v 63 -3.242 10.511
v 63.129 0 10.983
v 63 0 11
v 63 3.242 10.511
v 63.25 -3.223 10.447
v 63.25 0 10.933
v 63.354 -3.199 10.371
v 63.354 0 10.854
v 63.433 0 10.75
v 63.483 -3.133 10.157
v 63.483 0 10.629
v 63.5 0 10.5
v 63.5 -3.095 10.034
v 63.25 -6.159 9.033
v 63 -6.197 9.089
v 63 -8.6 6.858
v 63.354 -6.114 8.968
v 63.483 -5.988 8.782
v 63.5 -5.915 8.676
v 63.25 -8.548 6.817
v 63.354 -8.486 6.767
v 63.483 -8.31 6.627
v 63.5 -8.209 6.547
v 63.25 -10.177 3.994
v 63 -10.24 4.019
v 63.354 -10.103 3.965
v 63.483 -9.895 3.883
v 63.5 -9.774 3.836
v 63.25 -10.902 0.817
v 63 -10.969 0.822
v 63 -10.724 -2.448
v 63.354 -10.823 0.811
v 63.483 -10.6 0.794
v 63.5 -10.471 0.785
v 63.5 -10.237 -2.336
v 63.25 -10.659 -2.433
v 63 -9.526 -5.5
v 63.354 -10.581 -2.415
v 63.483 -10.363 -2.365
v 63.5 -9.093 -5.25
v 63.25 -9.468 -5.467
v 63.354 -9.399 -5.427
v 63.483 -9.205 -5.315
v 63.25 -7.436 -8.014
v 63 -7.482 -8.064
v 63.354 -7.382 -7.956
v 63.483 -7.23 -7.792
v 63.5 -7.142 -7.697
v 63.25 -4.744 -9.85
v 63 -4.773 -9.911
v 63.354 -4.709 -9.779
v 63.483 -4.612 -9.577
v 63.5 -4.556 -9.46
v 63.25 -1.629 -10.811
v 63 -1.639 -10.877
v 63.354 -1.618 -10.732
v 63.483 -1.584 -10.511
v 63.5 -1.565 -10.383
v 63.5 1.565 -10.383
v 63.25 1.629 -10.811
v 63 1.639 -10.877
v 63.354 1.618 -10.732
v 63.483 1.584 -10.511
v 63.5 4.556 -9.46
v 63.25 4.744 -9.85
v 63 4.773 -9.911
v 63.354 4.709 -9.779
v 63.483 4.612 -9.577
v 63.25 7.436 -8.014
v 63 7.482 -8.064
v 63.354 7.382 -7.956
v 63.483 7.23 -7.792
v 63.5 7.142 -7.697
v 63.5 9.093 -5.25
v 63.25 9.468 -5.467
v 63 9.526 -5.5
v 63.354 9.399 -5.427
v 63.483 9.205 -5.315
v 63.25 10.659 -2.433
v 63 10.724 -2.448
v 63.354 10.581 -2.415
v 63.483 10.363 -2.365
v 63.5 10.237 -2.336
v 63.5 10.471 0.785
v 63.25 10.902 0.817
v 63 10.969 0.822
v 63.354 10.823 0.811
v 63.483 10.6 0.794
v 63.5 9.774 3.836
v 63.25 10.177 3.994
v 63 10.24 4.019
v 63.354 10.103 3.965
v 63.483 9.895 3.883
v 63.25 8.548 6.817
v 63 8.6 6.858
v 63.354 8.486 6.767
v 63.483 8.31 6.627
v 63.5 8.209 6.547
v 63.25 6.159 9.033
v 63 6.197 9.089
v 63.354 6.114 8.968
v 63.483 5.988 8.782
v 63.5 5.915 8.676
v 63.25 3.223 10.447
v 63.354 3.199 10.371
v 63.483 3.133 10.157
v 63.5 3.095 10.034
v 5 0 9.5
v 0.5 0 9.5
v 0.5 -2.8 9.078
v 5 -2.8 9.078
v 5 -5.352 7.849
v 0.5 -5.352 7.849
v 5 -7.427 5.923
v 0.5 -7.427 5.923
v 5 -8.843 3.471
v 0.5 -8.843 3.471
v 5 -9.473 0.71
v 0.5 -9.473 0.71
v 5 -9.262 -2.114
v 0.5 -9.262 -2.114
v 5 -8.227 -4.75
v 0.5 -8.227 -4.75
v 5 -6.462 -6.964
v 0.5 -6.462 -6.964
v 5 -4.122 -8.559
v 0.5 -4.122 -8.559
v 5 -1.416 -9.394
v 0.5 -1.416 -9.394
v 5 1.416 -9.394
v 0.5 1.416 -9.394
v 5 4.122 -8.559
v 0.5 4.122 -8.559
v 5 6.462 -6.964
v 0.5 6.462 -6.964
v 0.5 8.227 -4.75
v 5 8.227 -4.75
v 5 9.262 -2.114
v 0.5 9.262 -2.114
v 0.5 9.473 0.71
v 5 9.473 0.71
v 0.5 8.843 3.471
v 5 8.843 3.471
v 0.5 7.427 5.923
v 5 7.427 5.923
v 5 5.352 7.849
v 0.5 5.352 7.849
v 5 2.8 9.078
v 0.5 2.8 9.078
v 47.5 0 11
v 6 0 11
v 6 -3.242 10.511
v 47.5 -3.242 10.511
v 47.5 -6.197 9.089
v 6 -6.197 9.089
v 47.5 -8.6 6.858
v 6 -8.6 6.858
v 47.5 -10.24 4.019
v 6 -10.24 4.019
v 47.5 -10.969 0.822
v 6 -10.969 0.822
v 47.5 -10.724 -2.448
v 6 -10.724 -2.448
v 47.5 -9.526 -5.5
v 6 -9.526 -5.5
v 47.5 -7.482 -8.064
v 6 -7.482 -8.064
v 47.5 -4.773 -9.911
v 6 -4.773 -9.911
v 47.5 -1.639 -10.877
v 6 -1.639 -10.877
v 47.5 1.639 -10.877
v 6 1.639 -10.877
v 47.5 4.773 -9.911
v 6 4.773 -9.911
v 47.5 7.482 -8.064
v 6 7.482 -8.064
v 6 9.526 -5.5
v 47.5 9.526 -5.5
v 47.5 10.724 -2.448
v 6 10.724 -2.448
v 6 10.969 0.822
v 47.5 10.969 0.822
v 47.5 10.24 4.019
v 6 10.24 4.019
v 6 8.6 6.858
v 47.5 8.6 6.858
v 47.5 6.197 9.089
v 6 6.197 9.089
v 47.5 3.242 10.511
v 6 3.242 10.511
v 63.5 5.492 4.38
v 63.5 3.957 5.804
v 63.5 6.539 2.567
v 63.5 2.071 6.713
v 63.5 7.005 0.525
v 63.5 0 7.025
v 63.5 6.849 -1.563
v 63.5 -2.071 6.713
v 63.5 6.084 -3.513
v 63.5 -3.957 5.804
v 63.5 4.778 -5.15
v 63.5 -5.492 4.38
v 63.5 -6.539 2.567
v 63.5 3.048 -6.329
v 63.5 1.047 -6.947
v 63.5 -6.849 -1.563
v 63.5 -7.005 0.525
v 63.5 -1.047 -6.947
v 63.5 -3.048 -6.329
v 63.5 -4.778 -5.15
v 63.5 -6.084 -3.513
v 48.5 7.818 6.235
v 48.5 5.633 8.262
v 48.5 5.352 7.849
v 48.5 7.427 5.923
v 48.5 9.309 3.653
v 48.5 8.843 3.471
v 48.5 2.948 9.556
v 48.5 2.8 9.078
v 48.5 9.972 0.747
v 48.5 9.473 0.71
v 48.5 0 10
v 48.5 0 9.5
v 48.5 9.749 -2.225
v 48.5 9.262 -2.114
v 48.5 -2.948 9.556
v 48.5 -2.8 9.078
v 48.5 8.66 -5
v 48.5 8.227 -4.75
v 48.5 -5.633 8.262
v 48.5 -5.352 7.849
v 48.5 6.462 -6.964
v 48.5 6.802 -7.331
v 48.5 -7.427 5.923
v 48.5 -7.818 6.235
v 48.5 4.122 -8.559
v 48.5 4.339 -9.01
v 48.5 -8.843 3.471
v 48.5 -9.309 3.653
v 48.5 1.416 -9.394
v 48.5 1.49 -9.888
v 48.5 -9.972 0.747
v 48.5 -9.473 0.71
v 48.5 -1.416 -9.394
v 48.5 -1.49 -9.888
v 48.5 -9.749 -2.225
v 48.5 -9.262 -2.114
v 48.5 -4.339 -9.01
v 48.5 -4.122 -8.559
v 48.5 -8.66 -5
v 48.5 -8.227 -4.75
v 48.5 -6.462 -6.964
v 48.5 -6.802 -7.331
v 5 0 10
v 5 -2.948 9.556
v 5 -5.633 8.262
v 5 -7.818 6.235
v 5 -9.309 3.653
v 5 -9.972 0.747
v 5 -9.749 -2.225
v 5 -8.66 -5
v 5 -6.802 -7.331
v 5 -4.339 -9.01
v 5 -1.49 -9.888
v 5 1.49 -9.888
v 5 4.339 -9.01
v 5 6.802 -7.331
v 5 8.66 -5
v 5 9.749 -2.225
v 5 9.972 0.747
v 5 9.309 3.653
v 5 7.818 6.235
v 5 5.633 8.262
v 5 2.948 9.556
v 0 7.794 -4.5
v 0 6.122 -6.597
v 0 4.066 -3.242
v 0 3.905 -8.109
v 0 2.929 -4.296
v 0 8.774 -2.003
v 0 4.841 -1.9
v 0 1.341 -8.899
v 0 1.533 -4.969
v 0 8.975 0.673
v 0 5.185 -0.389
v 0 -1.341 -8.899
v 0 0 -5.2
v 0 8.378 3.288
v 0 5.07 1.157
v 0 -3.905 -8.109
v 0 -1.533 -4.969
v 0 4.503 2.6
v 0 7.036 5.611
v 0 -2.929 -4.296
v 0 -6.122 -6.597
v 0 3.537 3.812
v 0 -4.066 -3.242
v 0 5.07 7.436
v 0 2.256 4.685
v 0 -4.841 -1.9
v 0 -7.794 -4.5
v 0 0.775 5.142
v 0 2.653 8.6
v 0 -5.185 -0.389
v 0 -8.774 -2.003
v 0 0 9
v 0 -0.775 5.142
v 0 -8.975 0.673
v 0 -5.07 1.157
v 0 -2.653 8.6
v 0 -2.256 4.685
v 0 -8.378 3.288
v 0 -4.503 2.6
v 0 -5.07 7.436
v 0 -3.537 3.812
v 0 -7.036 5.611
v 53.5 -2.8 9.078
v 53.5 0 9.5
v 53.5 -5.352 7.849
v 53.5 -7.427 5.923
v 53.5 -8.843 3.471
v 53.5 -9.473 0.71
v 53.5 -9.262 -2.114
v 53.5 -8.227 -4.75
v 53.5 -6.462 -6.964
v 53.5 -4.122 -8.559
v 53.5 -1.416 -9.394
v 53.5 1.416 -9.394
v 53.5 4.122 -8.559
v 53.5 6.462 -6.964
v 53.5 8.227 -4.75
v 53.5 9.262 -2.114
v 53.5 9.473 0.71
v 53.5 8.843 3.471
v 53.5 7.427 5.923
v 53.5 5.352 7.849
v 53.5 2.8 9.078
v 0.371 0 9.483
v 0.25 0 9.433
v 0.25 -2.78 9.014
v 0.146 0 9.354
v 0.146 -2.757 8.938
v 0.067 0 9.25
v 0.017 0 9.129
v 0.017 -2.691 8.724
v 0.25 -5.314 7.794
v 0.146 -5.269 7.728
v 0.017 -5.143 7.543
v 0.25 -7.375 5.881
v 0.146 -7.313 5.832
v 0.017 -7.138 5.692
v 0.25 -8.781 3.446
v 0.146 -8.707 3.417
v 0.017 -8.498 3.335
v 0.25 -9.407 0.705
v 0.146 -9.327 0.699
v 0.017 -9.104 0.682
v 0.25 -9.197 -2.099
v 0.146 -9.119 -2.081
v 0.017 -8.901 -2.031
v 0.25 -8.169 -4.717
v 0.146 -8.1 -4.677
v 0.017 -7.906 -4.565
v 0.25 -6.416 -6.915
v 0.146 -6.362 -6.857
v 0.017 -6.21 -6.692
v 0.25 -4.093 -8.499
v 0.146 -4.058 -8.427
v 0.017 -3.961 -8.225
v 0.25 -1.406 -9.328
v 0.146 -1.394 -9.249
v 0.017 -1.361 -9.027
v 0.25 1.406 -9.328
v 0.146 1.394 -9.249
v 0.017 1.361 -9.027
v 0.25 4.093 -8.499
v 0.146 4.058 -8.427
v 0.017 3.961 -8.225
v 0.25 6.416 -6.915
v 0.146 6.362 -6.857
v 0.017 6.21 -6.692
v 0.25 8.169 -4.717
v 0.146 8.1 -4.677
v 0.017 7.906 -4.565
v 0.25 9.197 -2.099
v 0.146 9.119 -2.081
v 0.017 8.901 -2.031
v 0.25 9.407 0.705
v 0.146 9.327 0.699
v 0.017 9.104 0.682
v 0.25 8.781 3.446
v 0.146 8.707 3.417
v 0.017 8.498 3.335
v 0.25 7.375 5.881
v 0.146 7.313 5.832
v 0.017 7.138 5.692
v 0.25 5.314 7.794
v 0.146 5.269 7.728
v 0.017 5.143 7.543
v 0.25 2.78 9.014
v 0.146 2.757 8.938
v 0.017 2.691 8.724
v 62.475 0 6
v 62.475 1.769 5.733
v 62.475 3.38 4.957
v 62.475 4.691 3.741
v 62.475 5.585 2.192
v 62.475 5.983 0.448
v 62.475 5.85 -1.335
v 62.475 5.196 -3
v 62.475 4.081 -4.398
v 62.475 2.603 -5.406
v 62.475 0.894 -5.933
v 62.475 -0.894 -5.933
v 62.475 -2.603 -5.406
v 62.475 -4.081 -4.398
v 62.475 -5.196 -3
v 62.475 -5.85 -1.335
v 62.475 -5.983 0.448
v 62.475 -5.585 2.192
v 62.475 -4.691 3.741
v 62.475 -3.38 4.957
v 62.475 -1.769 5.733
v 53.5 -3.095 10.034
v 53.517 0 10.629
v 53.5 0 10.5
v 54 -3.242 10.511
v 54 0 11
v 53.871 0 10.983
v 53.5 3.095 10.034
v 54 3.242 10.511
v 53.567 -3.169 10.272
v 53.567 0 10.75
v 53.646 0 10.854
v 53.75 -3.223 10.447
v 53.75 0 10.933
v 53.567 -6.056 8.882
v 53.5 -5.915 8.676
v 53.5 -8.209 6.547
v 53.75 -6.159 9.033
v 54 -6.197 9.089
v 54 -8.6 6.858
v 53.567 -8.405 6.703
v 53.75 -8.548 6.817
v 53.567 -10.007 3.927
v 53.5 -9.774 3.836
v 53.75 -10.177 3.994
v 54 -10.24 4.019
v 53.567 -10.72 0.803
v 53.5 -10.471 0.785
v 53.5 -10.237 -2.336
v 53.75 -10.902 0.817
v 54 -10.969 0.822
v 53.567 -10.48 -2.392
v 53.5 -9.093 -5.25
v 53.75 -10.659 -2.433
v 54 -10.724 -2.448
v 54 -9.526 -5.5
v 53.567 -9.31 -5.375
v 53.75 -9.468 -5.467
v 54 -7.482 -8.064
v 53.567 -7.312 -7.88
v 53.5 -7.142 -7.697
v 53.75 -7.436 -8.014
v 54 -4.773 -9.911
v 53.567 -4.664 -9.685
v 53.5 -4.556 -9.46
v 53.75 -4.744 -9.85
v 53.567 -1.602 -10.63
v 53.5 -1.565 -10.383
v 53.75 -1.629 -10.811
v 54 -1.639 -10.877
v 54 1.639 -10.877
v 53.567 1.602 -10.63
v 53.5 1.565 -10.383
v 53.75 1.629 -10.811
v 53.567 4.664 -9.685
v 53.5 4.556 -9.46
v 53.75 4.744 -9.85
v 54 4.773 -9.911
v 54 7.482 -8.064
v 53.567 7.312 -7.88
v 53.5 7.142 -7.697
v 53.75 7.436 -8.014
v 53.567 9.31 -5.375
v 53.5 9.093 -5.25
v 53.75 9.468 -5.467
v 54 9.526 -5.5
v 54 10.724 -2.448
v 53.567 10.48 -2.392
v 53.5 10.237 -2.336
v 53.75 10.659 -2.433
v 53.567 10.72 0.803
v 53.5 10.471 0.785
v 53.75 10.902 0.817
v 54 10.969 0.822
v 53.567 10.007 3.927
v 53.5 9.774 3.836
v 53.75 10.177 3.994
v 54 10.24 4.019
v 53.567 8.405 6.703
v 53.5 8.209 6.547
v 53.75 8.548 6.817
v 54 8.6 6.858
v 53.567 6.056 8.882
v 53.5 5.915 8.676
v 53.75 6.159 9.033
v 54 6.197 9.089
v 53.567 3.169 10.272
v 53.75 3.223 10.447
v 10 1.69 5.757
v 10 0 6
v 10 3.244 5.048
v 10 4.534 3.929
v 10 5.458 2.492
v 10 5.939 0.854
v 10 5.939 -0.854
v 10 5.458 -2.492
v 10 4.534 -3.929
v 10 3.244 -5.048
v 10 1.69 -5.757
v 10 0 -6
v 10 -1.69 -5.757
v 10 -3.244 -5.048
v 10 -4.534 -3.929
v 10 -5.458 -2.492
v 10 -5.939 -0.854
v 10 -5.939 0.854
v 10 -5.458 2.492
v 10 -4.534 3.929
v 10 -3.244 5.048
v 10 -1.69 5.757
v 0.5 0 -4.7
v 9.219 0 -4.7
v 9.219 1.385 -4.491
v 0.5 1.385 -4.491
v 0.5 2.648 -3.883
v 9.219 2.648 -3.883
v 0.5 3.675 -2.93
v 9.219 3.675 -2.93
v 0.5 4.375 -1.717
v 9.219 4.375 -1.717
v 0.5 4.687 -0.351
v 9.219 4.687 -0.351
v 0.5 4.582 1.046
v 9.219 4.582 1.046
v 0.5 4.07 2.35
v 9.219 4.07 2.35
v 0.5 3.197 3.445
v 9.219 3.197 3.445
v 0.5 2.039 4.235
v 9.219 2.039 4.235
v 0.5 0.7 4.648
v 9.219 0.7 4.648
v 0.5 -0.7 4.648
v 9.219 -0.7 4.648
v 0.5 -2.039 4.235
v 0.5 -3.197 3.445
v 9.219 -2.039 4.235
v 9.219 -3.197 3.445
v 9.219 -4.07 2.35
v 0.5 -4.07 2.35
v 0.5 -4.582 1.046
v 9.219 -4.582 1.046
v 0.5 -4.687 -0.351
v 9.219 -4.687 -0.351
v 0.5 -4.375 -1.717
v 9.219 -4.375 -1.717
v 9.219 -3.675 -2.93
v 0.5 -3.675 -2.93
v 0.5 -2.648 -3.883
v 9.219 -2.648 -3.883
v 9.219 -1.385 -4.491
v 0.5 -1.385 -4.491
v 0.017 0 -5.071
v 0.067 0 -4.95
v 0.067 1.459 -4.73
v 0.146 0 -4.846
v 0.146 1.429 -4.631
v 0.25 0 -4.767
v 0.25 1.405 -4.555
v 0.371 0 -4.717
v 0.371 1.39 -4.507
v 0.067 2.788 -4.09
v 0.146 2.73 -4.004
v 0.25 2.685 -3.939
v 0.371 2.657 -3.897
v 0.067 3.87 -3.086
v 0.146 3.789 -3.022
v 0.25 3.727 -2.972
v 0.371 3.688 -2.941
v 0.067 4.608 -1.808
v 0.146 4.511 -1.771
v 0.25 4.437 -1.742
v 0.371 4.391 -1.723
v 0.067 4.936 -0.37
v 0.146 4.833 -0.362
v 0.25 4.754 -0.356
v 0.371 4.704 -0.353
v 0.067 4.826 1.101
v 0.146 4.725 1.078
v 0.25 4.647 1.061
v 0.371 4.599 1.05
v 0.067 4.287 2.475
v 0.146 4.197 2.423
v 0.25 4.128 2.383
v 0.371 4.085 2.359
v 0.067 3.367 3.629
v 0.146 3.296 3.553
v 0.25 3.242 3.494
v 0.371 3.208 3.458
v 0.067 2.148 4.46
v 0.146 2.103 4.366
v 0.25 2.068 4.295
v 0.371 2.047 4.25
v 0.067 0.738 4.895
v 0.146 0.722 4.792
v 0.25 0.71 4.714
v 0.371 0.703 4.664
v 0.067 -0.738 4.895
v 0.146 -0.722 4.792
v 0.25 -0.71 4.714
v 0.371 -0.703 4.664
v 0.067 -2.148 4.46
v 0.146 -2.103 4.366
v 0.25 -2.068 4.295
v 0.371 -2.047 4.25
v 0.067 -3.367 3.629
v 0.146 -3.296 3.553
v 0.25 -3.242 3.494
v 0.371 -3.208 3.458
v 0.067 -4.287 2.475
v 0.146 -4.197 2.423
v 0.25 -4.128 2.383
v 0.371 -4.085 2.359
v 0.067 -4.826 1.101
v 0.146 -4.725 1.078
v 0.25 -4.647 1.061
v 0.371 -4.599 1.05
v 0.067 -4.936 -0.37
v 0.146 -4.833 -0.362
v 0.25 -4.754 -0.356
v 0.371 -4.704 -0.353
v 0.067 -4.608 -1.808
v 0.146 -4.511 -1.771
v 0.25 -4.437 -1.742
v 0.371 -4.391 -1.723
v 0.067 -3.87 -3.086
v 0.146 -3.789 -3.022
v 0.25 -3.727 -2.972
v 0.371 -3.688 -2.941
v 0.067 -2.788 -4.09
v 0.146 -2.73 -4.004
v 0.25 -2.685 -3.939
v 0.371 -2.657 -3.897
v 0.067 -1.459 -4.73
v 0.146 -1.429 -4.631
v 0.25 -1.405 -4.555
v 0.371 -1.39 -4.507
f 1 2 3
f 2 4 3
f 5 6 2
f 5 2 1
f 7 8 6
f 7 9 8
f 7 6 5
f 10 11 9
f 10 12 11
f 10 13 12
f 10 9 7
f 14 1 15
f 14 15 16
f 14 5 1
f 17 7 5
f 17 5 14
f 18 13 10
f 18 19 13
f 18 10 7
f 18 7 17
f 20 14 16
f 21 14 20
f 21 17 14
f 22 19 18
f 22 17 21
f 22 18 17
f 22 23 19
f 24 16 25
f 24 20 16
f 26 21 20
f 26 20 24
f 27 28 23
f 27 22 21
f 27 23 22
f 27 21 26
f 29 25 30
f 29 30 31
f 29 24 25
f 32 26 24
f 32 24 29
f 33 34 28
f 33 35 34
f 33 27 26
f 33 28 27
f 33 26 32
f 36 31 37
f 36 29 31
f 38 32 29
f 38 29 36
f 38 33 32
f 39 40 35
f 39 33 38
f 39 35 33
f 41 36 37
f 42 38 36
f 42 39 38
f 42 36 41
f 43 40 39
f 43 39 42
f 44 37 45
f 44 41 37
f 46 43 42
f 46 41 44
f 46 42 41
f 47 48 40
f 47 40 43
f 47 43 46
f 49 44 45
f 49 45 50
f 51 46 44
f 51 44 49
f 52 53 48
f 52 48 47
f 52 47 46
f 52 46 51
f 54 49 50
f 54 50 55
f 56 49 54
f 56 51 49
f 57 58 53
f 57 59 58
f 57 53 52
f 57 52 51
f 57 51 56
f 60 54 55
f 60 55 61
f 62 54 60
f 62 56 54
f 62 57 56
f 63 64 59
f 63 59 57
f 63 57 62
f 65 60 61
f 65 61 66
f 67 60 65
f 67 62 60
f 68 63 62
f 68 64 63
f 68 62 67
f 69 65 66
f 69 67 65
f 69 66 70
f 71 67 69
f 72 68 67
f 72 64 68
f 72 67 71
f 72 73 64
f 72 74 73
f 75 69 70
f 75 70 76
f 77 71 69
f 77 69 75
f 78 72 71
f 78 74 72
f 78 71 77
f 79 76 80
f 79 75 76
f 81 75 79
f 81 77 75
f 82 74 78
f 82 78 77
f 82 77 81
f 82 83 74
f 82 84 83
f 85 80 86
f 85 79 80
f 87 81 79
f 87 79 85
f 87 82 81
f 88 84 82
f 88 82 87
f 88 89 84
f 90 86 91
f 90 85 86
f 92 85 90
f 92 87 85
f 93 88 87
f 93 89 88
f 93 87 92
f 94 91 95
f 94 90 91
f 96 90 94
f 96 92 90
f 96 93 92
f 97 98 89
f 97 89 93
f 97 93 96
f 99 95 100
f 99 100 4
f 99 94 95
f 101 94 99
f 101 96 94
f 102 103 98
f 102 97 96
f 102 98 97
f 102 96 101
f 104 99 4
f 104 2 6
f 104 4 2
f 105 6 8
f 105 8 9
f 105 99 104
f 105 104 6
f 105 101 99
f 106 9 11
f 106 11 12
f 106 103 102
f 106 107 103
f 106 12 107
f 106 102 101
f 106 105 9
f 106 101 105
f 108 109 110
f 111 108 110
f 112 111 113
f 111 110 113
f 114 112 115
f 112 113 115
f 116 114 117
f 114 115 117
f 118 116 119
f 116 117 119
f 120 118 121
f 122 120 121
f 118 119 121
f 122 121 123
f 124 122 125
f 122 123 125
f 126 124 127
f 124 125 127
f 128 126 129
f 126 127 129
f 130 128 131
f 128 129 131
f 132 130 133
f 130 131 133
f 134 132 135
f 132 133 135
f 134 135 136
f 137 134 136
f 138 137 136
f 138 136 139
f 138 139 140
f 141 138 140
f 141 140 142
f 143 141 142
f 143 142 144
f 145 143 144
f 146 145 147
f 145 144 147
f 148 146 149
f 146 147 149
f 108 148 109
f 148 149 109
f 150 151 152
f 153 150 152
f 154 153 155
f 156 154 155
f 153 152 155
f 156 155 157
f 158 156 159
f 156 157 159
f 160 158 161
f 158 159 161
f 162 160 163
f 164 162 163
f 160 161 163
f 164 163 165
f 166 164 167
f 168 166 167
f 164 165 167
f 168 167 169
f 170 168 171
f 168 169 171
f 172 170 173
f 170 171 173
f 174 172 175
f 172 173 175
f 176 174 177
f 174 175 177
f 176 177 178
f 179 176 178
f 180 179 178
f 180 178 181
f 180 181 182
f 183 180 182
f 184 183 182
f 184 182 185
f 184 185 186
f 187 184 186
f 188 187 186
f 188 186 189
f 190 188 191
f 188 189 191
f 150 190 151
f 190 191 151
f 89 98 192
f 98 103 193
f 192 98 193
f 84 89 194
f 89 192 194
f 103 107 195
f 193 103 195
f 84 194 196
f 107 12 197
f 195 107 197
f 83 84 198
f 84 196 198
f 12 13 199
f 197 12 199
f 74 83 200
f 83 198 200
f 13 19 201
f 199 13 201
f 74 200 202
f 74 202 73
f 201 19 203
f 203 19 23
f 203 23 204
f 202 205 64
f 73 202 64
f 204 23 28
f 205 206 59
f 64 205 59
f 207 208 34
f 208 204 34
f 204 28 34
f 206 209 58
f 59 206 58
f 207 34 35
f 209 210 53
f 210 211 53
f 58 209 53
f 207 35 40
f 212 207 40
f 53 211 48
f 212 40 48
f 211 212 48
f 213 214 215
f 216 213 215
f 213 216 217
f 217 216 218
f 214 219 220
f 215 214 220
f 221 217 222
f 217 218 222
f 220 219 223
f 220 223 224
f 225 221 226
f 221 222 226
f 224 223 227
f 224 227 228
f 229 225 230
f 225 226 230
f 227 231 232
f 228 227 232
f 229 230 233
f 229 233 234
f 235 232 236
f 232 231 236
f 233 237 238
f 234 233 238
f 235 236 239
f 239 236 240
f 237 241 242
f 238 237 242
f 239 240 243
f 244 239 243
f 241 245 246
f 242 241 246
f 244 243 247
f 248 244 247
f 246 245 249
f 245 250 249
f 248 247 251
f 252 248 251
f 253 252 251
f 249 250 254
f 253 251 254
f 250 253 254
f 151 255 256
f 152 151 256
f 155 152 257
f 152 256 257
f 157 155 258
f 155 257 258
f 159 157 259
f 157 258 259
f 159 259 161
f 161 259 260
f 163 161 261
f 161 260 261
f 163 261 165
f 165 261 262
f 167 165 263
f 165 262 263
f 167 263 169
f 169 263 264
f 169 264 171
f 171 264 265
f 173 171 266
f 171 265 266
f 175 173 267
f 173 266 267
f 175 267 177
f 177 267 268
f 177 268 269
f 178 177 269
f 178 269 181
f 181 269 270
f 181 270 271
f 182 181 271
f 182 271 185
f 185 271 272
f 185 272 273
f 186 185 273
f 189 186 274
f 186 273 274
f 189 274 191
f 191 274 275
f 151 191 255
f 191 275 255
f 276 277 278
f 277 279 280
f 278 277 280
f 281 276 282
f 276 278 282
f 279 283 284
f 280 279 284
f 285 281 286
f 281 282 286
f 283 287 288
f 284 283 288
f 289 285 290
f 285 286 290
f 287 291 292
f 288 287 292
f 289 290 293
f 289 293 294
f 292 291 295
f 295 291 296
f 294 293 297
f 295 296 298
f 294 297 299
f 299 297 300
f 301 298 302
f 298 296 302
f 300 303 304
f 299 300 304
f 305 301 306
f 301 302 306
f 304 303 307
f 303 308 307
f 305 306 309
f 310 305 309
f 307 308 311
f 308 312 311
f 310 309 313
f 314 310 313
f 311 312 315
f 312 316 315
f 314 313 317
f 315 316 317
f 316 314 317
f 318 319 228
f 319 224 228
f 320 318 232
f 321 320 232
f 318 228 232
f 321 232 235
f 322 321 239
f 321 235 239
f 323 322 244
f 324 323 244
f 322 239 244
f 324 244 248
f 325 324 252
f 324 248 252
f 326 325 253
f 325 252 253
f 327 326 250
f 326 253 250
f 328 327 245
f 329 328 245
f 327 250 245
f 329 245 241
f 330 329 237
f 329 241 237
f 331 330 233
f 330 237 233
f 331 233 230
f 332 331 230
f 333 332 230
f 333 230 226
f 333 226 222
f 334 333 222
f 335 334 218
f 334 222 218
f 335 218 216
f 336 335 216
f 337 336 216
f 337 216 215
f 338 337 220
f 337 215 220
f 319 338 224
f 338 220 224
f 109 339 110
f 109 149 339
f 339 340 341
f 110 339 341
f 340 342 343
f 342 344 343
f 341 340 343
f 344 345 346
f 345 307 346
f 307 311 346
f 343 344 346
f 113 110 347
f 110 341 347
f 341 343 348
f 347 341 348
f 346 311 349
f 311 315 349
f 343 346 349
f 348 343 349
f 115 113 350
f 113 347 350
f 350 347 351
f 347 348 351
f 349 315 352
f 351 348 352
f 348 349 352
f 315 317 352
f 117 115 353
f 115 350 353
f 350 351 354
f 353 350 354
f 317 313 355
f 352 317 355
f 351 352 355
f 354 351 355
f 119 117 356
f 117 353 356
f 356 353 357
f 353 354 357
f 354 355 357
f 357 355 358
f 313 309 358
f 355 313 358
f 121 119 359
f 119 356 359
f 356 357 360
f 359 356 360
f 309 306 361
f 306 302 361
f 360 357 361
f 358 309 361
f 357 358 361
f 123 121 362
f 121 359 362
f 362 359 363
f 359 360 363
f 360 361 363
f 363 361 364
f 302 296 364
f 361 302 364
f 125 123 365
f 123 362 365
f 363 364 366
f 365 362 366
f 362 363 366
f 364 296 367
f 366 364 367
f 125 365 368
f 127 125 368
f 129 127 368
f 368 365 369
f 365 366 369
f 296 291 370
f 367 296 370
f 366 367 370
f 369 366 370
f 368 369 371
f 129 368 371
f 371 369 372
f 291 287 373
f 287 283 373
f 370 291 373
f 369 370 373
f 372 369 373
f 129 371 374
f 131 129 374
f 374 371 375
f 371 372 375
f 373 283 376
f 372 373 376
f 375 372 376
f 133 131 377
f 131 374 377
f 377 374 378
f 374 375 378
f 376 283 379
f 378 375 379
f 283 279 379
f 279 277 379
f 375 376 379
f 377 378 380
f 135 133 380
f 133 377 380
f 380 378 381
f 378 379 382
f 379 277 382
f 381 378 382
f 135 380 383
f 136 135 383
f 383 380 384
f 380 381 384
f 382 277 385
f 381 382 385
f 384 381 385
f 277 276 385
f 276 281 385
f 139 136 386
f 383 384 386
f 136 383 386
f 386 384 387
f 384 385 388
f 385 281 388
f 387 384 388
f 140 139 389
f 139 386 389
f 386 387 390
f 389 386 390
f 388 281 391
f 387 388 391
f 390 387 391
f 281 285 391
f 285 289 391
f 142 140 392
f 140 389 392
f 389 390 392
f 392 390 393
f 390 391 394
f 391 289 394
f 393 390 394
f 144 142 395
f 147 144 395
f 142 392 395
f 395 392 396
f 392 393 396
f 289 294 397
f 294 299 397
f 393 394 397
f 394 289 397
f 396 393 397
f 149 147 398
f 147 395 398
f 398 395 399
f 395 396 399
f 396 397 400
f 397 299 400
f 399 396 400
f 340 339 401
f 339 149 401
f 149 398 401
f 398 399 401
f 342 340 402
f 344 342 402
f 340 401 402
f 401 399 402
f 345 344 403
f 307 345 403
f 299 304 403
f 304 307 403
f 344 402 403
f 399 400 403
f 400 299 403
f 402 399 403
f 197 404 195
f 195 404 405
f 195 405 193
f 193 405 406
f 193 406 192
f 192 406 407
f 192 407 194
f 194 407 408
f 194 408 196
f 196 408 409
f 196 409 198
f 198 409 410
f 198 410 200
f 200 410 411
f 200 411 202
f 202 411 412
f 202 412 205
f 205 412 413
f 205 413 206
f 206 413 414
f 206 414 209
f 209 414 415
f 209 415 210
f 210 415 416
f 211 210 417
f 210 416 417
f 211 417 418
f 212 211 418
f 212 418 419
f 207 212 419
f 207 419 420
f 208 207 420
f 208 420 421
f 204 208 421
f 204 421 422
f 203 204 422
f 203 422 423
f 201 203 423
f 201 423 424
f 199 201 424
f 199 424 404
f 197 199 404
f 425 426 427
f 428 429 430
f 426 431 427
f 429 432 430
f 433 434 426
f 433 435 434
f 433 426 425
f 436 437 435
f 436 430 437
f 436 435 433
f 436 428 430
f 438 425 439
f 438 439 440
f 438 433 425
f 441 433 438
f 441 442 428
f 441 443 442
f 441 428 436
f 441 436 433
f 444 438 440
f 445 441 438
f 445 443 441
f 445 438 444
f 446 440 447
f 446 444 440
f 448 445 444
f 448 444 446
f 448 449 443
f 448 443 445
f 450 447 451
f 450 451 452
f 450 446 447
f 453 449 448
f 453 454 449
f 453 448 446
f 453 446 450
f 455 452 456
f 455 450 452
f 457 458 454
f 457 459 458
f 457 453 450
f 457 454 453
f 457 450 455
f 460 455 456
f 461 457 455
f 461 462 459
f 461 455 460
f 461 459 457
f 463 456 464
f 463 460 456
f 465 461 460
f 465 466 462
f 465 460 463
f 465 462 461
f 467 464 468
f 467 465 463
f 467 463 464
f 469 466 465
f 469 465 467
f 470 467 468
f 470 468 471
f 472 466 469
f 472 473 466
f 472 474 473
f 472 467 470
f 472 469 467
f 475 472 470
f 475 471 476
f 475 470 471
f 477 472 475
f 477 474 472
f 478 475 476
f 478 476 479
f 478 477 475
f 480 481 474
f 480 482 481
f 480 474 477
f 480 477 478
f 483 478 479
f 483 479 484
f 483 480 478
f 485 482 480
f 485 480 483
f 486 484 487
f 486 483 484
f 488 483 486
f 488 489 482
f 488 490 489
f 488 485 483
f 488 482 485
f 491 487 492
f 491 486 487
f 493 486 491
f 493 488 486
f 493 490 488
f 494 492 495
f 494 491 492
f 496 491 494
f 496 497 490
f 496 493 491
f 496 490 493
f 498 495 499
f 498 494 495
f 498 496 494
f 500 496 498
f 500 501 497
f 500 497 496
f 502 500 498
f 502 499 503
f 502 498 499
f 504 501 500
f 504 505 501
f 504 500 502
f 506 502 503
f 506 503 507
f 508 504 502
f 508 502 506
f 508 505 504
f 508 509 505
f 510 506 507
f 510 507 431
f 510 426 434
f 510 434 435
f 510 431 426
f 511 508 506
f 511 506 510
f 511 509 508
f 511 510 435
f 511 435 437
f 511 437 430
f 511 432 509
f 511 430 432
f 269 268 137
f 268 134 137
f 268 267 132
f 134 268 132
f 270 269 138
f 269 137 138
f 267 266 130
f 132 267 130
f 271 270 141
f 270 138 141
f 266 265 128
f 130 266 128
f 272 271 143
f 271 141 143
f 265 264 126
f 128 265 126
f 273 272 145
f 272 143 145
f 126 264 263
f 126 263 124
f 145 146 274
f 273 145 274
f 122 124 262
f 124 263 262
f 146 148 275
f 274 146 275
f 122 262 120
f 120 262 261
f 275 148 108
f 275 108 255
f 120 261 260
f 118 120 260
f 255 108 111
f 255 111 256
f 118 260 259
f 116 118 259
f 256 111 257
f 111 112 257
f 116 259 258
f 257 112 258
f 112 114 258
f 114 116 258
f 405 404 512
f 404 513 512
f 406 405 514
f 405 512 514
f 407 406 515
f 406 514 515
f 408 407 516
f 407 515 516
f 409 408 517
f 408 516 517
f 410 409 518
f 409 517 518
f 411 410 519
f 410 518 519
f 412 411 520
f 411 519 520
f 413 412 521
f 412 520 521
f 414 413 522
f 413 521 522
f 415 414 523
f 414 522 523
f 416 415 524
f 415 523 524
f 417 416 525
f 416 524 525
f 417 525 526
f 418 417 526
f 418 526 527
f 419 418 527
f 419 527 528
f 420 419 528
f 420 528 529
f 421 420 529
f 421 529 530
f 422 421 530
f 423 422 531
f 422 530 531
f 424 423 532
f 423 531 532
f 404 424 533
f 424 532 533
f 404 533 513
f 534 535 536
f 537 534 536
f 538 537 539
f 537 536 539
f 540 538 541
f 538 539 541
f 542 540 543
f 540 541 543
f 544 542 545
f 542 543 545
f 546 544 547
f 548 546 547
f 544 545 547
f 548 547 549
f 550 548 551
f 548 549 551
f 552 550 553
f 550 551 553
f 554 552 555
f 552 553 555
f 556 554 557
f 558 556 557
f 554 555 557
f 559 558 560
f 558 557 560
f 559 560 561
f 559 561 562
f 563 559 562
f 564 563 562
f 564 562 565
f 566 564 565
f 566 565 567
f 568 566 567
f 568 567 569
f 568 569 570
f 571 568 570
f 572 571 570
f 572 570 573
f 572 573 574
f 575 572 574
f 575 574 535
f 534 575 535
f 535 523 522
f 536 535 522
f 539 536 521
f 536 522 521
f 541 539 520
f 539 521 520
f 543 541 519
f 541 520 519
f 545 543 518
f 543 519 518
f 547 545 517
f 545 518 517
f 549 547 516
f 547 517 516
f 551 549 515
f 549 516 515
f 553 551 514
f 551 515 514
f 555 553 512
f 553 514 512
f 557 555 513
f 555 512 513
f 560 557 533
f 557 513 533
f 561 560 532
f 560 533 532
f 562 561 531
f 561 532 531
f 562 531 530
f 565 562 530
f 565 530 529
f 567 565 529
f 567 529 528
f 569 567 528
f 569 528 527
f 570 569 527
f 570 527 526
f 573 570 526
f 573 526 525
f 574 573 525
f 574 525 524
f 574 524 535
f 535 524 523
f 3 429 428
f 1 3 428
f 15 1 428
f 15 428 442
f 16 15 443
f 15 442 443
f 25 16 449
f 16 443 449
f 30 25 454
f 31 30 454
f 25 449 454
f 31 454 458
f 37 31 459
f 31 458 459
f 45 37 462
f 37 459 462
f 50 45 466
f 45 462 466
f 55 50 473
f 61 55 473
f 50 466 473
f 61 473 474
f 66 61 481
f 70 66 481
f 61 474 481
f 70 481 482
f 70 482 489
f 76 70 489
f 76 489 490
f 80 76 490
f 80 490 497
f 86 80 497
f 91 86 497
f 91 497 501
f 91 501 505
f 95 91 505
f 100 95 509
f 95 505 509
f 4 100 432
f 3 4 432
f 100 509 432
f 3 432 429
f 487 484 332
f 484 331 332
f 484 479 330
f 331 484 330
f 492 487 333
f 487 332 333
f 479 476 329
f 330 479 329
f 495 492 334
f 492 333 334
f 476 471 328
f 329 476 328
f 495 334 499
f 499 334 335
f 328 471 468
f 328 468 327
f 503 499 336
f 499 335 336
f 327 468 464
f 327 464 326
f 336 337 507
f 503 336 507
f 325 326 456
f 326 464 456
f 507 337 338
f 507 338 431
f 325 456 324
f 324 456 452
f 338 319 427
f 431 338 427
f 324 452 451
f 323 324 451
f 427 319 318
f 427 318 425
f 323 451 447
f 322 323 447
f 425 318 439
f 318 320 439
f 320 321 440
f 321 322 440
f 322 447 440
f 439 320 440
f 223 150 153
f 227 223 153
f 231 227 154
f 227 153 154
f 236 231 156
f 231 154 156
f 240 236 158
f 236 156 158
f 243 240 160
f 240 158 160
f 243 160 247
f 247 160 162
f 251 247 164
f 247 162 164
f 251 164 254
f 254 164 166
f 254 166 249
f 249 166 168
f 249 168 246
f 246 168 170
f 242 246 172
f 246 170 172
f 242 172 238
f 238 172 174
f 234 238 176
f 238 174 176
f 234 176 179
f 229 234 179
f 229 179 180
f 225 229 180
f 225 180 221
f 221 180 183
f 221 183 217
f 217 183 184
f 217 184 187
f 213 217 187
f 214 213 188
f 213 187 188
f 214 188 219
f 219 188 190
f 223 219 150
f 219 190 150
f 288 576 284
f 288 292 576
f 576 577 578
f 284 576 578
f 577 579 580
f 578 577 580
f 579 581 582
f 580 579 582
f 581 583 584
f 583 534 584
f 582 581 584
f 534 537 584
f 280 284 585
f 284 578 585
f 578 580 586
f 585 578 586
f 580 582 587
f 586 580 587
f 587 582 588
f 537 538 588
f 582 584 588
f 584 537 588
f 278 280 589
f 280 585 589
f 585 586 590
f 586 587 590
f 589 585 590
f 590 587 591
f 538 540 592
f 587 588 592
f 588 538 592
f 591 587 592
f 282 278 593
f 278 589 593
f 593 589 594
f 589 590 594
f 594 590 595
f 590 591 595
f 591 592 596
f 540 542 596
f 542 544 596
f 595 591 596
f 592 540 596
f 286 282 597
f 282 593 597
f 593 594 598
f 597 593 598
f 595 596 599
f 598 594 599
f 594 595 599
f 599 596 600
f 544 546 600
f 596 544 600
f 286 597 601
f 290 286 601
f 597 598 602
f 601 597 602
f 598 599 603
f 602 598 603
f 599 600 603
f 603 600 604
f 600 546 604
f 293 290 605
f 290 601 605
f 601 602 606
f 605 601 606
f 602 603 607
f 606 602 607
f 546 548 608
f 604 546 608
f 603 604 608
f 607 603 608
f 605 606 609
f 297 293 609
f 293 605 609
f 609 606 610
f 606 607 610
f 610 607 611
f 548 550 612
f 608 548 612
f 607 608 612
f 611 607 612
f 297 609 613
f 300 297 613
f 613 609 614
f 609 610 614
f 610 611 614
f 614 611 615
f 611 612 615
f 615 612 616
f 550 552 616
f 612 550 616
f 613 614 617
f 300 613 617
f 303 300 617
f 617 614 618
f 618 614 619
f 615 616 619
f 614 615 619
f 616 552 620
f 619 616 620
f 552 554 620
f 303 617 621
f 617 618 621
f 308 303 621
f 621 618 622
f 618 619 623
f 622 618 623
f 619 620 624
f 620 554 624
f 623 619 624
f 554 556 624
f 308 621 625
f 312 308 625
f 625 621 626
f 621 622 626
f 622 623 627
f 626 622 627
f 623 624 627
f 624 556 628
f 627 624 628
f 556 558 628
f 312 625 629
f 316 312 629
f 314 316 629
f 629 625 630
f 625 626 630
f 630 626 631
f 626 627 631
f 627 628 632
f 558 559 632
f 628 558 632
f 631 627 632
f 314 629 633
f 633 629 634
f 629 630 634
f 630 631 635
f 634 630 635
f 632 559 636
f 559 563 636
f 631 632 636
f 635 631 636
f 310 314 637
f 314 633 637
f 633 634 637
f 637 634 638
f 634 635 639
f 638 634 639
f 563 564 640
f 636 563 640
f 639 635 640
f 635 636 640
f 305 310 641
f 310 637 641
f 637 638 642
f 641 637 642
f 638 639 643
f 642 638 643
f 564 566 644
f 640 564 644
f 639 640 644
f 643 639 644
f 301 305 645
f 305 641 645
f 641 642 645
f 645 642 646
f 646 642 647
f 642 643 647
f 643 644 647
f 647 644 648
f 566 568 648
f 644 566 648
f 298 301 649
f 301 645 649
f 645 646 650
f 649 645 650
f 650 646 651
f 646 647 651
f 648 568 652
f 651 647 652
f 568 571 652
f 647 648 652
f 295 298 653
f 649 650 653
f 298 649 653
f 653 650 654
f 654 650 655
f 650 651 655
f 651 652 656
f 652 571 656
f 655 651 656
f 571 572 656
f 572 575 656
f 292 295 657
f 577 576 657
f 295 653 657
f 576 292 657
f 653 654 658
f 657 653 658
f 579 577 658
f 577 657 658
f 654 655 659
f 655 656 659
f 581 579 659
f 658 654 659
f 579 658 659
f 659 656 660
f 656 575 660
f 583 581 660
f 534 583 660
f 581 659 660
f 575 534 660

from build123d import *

# Parameters (mm, degrees)
FURO_ROSCADO_DE_M14X2_01_D           = 12
FURO_ROSCADO_DE_M14X2_01_DEPTH       = 53.5
FURO_ROSCADO_DE_M14X2_01_CSINK_D     = 14.05
FURO_ROSCADO_DE_M14X2_01_CSINK_ANGLE = 90
FURO_ROSCADO_DE_M14X2_01_TIP         = 3.605163714
FURO1_D                              = 9.4
FURO1_DEPTH                          = 10
CHANFRO1_SIZE                        = 1
FILETE1_R                            = 0.5


with BuildPart() as part:
    # Esboço1 → Revolução1 (revolve)
    with BuildSketch(Plane.XY, mode=Mode.PRIVATE) as revolu_o1_sk:
        Polygon((0, 0), (63.5, 0), (63.5, 11), (53.5, 11), (53.5, 9.5), (48.5, 9.5), (48.5, 11), (5, 11), (5, 9.5), (0, 9.5), align=None)
    revolve(revolu_o1_sk.sketch.rotate(Axis((0, 0, 0), (1, 0, 0)), 90), axis=Axis((0, 0, 0), (1, 0, 0)))

    # Furo roscado de M14x2.01
    with Locations(Plane(origin=(63.5, 0, 0), x_dir=(0, 0, -1), z_dir=(1, 0, 0))):
        with Locations((0, 0)):
            CounterSinkHole(FURO_ROSCADO_DE_M14X2_01_D / 2, FURO_ROSCADO_DE_M14X2_01_CSINK_D / 2, depth=FURO_ROSCADO_DE_M14X2_01_DEPTH, counter_sink_angle=FURO_ROSCADO_DE_M14X2_01_CSINK_ANGLE)
            with Locations((0, 0, -(FURO_ROSCADO_DE_M14X2_01_DEPTH + FURO_ROSCADO_DE_M14X2_01_TIP / 2))):  # 118° drill point
                Cone(0, FURO_ROSCADO_DE_M14X2_01_D / 2, FURO_ROSCADO_DE_M14X2_01_TIP, mode=Mode.SUBTRACT)

    # Furo1
    with Locations(Plane.ZY):
        with Locations((0, 0)):
            Hole(FURO1_D / 2, depth=FURO1_DEPTH)

    # Chanfro1
    chanfro1_edges = [part.edges().sort_by_distance(p)[0] for p in [
        (5, 0, -11),
        (48.5, 0, -11),
    ]]
    chamfer(chanfro1_edges, length=CHANFRO1_SIZE)

    # Filete1
    filete1_edges = [part.edges().sort_by_distance(p)[0] for p in [
        (63.5, 0, -11),
        (0, 0, 4.7),
        (0, 0, -9.5),
        (53.5, 0, -11),
    ]]
    fillet(filete1_edges, radius=FILETE1_R)


solid = part.part
